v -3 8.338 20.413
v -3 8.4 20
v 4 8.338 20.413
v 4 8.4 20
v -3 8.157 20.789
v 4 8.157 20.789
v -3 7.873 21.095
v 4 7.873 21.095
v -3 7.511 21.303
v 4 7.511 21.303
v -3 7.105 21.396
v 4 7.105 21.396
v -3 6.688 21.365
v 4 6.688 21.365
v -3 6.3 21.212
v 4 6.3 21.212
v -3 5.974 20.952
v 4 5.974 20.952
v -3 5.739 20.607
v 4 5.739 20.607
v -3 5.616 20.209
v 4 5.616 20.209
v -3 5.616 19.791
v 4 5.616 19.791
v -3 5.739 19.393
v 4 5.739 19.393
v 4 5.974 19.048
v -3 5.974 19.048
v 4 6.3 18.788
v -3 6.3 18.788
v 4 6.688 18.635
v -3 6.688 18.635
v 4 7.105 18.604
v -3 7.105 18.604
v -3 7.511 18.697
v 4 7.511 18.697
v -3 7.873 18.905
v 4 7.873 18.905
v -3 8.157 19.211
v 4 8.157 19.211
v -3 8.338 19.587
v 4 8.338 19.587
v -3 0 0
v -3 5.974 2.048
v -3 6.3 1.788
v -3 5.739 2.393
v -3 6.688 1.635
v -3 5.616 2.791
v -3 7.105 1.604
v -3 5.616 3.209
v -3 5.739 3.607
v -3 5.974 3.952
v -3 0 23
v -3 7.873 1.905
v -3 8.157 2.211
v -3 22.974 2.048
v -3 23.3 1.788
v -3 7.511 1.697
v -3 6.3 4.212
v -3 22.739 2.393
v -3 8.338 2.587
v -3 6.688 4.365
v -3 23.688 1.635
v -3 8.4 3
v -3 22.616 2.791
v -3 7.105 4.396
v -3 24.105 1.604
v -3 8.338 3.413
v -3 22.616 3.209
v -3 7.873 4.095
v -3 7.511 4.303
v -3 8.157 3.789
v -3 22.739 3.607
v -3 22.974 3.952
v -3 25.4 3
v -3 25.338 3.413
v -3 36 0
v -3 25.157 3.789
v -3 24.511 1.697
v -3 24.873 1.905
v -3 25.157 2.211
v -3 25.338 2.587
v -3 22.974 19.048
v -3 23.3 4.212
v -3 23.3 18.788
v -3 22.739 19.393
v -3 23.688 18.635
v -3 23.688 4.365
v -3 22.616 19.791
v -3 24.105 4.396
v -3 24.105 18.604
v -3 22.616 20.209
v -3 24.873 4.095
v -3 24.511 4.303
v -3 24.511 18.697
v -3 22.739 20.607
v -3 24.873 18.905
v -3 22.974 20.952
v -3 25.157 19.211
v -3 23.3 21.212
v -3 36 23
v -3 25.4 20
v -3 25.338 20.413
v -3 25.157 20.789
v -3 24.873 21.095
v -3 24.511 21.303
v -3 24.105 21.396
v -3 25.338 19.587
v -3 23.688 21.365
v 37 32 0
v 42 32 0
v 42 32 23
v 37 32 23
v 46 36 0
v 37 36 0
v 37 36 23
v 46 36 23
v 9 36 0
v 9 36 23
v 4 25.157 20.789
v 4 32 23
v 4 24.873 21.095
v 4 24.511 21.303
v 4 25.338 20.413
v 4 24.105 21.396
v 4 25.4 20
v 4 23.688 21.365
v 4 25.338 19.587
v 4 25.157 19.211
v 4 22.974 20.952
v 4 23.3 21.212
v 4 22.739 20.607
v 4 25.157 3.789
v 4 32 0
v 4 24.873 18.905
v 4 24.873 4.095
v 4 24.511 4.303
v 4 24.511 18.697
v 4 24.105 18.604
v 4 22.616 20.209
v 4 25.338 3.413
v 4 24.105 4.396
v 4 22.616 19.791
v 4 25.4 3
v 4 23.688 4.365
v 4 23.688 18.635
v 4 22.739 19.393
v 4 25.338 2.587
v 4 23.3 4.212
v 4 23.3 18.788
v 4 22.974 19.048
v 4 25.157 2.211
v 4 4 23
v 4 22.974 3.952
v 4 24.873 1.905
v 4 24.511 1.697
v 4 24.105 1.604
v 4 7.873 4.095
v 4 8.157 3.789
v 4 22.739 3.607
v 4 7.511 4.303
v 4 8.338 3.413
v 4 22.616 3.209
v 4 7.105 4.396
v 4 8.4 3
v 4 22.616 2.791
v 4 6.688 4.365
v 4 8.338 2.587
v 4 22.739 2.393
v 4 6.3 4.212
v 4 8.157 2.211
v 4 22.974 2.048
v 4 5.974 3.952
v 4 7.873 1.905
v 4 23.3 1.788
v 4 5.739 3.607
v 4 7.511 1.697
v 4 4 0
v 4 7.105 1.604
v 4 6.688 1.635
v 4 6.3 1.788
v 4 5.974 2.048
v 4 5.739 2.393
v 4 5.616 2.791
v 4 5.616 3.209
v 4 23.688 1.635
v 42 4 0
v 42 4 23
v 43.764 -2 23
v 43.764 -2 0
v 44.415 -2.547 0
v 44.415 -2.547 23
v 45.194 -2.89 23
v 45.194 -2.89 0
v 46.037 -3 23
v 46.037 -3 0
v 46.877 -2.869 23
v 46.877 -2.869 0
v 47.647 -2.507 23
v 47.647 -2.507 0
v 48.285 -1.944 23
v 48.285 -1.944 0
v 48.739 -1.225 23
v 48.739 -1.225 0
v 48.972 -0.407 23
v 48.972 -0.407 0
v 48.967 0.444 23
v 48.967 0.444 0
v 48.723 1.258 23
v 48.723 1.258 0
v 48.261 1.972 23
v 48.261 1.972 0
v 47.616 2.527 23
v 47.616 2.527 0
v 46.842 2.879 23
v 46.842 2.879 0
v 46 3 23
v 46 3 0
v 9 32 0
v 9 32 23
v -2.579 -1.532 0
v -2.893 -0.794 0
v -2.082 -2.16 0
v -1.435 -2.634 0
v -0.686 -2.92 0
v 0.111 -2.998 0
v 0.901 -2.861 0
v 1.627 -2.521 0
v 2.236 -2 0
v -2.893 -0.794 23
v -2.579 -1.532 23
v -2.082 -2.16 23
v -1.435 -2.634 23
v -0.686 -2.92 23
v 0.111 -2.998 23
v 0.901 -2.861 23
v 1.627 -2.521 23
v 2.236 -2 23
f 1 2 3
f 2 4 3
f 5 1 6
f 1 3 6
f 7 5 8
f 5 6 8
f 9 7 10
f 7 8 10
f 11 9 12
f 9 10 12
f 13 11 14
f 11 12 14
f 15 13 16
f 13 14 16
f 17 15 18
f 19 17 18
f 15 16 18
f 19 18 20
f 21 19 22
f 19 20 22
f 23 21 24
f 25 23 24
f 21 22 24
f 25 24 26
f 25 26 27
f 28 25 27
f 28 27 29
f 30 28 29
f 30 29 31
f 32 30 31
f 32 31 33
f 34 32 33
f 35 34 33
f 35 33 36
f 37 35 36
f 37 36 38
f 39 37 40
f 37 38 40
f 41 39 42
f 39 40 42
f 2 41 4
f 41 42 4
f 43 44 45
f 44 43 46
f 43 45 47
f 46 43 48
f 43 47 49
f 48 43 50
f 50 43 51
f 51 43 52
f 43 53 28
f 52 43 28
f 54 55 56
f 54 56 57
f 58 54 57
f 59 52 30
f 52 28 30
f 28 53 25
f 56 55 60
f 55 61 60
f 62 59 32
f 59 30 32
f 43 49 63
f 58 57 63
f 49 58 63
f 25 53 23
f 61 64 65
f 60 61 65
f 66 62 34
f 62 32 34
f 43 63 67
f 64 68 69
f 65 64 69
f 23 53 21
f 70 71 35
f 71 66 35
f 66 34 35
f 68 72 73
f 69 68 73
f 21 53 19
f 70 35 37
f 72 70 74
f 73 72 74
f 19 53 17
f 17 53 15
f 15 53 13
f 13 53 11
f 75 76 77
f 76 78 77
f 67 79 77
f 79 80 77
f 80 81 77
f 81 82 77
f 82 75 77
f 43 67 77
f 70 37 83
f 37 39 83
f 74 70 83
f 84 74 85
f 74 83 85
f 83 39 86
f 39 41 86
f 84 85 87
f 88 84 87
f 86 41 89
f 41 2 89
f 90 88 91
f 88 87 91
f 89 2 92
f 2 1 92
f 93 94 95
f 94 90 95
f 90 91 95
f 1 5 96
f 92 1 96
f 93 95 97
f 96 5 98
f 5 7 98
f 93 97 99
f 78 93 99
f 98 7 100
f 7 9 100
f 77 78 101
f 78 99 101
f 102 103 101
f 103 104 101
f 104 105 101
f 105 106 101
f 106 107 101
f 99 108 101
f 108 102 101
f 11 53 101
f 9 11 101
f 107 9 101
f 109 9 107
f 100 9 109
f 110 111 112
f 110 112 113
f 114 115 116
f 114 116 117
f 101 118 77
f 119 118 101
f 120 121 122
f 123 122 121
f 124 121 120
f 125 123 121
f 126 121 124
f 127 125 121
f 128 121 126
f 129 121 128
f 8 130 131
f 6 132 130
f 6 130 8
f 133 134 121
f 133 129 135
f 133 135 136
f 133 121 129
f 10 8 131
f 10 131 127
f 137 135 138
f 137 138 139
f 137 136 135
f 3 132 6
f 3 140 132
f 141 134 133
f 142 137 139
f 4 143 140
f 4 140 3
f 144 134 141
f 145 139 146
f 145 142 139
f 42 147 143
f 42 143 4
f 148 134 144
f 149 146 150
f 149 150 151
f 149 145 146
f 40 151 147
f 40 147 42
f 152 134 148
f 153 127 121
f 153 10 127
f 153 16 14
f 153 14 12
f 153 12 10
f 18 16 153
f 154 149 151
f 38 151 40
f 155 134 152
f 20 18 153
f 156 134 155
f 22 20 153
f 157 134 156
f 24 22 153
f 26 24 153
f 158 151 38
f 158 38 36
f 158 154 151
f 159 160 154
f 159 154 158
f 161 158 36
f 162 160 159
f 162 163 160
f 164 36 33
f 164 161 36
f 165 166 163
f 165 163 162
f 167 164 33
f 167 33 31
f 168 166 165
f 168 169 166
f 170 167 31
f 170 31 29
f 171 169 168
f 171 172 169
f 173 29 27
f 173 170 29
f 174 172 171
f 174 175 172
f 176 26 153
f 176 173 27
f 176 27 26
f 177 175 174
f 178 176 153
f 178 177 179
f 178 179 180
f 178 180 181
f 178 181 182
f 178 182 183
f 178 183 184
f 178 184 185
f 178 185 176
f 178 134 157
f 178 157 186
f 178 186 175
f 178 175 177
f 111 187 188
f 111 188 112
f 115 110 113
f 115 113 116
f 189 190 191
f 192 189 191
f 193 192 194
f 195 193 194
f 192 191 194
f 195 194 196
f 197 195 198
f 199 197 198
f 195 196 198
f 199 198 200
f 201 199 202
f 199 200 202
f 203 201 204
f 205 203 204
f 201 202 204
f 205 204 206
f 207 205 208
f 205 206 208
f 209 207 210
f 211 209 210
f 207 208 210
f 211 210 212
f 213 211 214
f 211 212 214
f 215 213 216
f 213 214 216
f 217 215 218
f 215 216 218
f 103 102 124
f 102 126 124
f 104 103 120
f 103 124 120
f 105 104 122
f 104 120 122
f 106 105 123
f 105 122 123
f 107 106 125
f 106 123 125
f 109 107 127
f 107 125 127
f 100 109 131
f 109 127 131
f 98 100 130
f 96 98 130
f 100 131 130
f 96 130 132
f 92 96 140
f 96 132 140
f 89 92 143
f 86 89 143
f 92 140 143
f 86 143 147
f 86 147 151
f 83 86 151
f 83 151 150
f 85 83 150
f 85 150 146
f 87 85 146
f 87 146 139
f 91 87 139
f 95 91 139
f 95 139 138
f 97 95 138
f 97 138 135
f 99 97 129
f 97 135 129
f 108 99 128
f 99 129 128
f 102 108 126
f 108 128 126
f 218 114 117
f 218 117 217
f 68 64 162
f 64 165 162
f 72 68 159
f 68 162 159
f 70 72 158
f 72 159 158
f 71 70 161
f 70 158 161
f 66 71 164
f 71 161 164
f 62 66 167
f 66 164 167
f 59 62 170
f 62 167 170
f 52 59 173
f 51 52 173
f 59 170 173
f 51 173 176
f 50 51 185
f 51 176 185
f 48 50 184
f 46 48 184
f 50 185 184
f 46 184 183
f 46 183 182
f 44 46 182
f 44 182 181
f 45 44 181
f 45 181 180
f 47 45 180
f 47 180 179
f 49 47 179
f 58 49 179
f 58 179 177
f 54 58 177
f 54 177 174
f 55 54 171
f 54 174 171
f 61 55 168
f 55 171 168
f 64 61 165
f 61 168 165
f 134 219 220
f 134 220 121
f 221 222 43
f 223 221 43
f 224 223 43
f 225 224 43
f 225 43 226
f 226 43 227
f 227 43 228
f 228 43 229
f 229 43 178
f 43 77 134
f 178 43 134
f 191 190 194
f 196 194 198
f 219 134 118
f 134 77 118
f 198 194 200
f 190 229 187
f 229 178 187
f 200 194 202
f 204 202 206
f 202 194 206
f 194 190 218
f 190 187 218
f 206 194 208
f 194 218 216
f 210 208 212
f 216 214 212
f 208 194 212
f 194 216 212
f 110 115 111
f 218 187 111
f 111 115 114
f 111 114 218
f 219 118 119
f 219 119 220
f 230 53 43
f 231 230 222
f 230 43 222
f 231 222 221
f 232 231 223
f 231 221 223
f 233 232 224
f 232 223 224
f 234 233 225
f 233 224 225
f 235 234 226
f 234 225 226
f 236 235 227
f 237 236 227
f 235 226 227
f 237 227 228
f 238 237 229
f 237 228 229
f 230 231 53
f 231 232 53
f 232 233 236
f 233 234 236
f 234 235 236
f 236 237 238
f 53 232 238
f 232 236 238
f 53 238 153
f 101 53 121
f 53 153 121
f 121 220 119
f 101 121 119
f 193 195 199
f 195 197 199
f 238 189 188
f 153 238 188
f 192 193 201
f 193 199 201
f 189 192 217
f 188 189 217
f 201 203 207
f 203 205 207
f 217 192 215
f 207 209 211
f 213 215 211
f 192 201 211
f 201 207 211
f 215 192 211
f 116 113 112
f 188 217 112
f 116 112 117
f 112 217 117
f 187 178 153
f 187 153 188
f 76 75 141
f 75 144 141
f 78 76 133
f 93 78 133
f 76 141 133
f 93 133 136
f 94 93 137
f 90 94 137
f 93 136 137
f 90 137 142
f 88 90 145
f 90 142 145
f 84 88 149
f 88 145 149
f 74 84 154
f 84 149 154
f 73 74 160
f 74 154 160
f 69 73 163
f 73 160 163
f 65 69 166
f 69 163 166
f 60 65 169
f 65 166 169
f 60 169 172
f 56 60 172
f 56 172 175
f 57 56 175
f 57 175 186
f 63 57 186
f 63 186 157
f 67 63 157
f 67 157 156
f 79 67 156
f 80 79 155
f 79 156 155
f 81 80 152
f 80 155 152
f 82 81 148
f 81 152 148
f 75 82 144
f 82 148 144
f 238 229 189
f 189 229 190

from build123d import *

# Parameters (mm, degrees)
PAD014_DEPTH    = 23
PAD015_DEPTH    = 23
SKETCH022_W     = 36
SKETCH022_H     = 23
PAD016_DEPTH    = 3
SKETCH023_R     = 1.4
POCKET004_DEPTH = 5


with BuildPart() as part:
    # Sketch019 → Pad014 (new body)
    with BuildSketch(Plane.XY):
        Polygon((4, 4), (42, 4), (42, 32), (37, 32), (37, 36), (46, 36), (46, 0), (0, 0), (0, 36), (9, 36), (9, 32), (4, 32), align=None)
    extrude(amount=PAD014_DEPTH)

    # Sketch020 → Pad015 (join)
    with BuildSketch(Plane.XY):
        with BuildLine():
            ThreePointArc((43.763932, -2), (48.738613, -1.224745), (46, 3))
            Line((46, 3), (46, 0))
            Line((0, 0), (46, 0))
            Line((0, 3), (0, 0))
            ThreePointArc((0, 3), (-2.738613, -1.224745), (2.236068, -2))
            Line((2.236068, -2), (43.763932, -2))
        make_face()
    extrude(amount=PAD015_DEPTH)

    # Sketch022 → Pad016 (join)
    with BuildSketch(Plane.YZ):
        with Locations((18, 11.5)):
            Rectangle(SKETCH022_W, SKETCH022_H)
    extrude(amount=-PAD016_DEPTH)

    # Sketch023 → Pocket004 (cut, symmetric)
    with BuildSketch(Plane.YZ):
        with Locations((7, 20)):
            Circle(SKETCH023_R)
        with Locations((24, 20)):
            Circle(SKETCH023_R)
        with Locations((7, 3)):
            Circle(SKETCH023_R)
        with Locations((24, 3)):
            Circle(SKETCH023_R)
    extrude(amount=POCKET004_DEPTH, both=True, mode=Mode.SUBTRACT)


solid = part.part
